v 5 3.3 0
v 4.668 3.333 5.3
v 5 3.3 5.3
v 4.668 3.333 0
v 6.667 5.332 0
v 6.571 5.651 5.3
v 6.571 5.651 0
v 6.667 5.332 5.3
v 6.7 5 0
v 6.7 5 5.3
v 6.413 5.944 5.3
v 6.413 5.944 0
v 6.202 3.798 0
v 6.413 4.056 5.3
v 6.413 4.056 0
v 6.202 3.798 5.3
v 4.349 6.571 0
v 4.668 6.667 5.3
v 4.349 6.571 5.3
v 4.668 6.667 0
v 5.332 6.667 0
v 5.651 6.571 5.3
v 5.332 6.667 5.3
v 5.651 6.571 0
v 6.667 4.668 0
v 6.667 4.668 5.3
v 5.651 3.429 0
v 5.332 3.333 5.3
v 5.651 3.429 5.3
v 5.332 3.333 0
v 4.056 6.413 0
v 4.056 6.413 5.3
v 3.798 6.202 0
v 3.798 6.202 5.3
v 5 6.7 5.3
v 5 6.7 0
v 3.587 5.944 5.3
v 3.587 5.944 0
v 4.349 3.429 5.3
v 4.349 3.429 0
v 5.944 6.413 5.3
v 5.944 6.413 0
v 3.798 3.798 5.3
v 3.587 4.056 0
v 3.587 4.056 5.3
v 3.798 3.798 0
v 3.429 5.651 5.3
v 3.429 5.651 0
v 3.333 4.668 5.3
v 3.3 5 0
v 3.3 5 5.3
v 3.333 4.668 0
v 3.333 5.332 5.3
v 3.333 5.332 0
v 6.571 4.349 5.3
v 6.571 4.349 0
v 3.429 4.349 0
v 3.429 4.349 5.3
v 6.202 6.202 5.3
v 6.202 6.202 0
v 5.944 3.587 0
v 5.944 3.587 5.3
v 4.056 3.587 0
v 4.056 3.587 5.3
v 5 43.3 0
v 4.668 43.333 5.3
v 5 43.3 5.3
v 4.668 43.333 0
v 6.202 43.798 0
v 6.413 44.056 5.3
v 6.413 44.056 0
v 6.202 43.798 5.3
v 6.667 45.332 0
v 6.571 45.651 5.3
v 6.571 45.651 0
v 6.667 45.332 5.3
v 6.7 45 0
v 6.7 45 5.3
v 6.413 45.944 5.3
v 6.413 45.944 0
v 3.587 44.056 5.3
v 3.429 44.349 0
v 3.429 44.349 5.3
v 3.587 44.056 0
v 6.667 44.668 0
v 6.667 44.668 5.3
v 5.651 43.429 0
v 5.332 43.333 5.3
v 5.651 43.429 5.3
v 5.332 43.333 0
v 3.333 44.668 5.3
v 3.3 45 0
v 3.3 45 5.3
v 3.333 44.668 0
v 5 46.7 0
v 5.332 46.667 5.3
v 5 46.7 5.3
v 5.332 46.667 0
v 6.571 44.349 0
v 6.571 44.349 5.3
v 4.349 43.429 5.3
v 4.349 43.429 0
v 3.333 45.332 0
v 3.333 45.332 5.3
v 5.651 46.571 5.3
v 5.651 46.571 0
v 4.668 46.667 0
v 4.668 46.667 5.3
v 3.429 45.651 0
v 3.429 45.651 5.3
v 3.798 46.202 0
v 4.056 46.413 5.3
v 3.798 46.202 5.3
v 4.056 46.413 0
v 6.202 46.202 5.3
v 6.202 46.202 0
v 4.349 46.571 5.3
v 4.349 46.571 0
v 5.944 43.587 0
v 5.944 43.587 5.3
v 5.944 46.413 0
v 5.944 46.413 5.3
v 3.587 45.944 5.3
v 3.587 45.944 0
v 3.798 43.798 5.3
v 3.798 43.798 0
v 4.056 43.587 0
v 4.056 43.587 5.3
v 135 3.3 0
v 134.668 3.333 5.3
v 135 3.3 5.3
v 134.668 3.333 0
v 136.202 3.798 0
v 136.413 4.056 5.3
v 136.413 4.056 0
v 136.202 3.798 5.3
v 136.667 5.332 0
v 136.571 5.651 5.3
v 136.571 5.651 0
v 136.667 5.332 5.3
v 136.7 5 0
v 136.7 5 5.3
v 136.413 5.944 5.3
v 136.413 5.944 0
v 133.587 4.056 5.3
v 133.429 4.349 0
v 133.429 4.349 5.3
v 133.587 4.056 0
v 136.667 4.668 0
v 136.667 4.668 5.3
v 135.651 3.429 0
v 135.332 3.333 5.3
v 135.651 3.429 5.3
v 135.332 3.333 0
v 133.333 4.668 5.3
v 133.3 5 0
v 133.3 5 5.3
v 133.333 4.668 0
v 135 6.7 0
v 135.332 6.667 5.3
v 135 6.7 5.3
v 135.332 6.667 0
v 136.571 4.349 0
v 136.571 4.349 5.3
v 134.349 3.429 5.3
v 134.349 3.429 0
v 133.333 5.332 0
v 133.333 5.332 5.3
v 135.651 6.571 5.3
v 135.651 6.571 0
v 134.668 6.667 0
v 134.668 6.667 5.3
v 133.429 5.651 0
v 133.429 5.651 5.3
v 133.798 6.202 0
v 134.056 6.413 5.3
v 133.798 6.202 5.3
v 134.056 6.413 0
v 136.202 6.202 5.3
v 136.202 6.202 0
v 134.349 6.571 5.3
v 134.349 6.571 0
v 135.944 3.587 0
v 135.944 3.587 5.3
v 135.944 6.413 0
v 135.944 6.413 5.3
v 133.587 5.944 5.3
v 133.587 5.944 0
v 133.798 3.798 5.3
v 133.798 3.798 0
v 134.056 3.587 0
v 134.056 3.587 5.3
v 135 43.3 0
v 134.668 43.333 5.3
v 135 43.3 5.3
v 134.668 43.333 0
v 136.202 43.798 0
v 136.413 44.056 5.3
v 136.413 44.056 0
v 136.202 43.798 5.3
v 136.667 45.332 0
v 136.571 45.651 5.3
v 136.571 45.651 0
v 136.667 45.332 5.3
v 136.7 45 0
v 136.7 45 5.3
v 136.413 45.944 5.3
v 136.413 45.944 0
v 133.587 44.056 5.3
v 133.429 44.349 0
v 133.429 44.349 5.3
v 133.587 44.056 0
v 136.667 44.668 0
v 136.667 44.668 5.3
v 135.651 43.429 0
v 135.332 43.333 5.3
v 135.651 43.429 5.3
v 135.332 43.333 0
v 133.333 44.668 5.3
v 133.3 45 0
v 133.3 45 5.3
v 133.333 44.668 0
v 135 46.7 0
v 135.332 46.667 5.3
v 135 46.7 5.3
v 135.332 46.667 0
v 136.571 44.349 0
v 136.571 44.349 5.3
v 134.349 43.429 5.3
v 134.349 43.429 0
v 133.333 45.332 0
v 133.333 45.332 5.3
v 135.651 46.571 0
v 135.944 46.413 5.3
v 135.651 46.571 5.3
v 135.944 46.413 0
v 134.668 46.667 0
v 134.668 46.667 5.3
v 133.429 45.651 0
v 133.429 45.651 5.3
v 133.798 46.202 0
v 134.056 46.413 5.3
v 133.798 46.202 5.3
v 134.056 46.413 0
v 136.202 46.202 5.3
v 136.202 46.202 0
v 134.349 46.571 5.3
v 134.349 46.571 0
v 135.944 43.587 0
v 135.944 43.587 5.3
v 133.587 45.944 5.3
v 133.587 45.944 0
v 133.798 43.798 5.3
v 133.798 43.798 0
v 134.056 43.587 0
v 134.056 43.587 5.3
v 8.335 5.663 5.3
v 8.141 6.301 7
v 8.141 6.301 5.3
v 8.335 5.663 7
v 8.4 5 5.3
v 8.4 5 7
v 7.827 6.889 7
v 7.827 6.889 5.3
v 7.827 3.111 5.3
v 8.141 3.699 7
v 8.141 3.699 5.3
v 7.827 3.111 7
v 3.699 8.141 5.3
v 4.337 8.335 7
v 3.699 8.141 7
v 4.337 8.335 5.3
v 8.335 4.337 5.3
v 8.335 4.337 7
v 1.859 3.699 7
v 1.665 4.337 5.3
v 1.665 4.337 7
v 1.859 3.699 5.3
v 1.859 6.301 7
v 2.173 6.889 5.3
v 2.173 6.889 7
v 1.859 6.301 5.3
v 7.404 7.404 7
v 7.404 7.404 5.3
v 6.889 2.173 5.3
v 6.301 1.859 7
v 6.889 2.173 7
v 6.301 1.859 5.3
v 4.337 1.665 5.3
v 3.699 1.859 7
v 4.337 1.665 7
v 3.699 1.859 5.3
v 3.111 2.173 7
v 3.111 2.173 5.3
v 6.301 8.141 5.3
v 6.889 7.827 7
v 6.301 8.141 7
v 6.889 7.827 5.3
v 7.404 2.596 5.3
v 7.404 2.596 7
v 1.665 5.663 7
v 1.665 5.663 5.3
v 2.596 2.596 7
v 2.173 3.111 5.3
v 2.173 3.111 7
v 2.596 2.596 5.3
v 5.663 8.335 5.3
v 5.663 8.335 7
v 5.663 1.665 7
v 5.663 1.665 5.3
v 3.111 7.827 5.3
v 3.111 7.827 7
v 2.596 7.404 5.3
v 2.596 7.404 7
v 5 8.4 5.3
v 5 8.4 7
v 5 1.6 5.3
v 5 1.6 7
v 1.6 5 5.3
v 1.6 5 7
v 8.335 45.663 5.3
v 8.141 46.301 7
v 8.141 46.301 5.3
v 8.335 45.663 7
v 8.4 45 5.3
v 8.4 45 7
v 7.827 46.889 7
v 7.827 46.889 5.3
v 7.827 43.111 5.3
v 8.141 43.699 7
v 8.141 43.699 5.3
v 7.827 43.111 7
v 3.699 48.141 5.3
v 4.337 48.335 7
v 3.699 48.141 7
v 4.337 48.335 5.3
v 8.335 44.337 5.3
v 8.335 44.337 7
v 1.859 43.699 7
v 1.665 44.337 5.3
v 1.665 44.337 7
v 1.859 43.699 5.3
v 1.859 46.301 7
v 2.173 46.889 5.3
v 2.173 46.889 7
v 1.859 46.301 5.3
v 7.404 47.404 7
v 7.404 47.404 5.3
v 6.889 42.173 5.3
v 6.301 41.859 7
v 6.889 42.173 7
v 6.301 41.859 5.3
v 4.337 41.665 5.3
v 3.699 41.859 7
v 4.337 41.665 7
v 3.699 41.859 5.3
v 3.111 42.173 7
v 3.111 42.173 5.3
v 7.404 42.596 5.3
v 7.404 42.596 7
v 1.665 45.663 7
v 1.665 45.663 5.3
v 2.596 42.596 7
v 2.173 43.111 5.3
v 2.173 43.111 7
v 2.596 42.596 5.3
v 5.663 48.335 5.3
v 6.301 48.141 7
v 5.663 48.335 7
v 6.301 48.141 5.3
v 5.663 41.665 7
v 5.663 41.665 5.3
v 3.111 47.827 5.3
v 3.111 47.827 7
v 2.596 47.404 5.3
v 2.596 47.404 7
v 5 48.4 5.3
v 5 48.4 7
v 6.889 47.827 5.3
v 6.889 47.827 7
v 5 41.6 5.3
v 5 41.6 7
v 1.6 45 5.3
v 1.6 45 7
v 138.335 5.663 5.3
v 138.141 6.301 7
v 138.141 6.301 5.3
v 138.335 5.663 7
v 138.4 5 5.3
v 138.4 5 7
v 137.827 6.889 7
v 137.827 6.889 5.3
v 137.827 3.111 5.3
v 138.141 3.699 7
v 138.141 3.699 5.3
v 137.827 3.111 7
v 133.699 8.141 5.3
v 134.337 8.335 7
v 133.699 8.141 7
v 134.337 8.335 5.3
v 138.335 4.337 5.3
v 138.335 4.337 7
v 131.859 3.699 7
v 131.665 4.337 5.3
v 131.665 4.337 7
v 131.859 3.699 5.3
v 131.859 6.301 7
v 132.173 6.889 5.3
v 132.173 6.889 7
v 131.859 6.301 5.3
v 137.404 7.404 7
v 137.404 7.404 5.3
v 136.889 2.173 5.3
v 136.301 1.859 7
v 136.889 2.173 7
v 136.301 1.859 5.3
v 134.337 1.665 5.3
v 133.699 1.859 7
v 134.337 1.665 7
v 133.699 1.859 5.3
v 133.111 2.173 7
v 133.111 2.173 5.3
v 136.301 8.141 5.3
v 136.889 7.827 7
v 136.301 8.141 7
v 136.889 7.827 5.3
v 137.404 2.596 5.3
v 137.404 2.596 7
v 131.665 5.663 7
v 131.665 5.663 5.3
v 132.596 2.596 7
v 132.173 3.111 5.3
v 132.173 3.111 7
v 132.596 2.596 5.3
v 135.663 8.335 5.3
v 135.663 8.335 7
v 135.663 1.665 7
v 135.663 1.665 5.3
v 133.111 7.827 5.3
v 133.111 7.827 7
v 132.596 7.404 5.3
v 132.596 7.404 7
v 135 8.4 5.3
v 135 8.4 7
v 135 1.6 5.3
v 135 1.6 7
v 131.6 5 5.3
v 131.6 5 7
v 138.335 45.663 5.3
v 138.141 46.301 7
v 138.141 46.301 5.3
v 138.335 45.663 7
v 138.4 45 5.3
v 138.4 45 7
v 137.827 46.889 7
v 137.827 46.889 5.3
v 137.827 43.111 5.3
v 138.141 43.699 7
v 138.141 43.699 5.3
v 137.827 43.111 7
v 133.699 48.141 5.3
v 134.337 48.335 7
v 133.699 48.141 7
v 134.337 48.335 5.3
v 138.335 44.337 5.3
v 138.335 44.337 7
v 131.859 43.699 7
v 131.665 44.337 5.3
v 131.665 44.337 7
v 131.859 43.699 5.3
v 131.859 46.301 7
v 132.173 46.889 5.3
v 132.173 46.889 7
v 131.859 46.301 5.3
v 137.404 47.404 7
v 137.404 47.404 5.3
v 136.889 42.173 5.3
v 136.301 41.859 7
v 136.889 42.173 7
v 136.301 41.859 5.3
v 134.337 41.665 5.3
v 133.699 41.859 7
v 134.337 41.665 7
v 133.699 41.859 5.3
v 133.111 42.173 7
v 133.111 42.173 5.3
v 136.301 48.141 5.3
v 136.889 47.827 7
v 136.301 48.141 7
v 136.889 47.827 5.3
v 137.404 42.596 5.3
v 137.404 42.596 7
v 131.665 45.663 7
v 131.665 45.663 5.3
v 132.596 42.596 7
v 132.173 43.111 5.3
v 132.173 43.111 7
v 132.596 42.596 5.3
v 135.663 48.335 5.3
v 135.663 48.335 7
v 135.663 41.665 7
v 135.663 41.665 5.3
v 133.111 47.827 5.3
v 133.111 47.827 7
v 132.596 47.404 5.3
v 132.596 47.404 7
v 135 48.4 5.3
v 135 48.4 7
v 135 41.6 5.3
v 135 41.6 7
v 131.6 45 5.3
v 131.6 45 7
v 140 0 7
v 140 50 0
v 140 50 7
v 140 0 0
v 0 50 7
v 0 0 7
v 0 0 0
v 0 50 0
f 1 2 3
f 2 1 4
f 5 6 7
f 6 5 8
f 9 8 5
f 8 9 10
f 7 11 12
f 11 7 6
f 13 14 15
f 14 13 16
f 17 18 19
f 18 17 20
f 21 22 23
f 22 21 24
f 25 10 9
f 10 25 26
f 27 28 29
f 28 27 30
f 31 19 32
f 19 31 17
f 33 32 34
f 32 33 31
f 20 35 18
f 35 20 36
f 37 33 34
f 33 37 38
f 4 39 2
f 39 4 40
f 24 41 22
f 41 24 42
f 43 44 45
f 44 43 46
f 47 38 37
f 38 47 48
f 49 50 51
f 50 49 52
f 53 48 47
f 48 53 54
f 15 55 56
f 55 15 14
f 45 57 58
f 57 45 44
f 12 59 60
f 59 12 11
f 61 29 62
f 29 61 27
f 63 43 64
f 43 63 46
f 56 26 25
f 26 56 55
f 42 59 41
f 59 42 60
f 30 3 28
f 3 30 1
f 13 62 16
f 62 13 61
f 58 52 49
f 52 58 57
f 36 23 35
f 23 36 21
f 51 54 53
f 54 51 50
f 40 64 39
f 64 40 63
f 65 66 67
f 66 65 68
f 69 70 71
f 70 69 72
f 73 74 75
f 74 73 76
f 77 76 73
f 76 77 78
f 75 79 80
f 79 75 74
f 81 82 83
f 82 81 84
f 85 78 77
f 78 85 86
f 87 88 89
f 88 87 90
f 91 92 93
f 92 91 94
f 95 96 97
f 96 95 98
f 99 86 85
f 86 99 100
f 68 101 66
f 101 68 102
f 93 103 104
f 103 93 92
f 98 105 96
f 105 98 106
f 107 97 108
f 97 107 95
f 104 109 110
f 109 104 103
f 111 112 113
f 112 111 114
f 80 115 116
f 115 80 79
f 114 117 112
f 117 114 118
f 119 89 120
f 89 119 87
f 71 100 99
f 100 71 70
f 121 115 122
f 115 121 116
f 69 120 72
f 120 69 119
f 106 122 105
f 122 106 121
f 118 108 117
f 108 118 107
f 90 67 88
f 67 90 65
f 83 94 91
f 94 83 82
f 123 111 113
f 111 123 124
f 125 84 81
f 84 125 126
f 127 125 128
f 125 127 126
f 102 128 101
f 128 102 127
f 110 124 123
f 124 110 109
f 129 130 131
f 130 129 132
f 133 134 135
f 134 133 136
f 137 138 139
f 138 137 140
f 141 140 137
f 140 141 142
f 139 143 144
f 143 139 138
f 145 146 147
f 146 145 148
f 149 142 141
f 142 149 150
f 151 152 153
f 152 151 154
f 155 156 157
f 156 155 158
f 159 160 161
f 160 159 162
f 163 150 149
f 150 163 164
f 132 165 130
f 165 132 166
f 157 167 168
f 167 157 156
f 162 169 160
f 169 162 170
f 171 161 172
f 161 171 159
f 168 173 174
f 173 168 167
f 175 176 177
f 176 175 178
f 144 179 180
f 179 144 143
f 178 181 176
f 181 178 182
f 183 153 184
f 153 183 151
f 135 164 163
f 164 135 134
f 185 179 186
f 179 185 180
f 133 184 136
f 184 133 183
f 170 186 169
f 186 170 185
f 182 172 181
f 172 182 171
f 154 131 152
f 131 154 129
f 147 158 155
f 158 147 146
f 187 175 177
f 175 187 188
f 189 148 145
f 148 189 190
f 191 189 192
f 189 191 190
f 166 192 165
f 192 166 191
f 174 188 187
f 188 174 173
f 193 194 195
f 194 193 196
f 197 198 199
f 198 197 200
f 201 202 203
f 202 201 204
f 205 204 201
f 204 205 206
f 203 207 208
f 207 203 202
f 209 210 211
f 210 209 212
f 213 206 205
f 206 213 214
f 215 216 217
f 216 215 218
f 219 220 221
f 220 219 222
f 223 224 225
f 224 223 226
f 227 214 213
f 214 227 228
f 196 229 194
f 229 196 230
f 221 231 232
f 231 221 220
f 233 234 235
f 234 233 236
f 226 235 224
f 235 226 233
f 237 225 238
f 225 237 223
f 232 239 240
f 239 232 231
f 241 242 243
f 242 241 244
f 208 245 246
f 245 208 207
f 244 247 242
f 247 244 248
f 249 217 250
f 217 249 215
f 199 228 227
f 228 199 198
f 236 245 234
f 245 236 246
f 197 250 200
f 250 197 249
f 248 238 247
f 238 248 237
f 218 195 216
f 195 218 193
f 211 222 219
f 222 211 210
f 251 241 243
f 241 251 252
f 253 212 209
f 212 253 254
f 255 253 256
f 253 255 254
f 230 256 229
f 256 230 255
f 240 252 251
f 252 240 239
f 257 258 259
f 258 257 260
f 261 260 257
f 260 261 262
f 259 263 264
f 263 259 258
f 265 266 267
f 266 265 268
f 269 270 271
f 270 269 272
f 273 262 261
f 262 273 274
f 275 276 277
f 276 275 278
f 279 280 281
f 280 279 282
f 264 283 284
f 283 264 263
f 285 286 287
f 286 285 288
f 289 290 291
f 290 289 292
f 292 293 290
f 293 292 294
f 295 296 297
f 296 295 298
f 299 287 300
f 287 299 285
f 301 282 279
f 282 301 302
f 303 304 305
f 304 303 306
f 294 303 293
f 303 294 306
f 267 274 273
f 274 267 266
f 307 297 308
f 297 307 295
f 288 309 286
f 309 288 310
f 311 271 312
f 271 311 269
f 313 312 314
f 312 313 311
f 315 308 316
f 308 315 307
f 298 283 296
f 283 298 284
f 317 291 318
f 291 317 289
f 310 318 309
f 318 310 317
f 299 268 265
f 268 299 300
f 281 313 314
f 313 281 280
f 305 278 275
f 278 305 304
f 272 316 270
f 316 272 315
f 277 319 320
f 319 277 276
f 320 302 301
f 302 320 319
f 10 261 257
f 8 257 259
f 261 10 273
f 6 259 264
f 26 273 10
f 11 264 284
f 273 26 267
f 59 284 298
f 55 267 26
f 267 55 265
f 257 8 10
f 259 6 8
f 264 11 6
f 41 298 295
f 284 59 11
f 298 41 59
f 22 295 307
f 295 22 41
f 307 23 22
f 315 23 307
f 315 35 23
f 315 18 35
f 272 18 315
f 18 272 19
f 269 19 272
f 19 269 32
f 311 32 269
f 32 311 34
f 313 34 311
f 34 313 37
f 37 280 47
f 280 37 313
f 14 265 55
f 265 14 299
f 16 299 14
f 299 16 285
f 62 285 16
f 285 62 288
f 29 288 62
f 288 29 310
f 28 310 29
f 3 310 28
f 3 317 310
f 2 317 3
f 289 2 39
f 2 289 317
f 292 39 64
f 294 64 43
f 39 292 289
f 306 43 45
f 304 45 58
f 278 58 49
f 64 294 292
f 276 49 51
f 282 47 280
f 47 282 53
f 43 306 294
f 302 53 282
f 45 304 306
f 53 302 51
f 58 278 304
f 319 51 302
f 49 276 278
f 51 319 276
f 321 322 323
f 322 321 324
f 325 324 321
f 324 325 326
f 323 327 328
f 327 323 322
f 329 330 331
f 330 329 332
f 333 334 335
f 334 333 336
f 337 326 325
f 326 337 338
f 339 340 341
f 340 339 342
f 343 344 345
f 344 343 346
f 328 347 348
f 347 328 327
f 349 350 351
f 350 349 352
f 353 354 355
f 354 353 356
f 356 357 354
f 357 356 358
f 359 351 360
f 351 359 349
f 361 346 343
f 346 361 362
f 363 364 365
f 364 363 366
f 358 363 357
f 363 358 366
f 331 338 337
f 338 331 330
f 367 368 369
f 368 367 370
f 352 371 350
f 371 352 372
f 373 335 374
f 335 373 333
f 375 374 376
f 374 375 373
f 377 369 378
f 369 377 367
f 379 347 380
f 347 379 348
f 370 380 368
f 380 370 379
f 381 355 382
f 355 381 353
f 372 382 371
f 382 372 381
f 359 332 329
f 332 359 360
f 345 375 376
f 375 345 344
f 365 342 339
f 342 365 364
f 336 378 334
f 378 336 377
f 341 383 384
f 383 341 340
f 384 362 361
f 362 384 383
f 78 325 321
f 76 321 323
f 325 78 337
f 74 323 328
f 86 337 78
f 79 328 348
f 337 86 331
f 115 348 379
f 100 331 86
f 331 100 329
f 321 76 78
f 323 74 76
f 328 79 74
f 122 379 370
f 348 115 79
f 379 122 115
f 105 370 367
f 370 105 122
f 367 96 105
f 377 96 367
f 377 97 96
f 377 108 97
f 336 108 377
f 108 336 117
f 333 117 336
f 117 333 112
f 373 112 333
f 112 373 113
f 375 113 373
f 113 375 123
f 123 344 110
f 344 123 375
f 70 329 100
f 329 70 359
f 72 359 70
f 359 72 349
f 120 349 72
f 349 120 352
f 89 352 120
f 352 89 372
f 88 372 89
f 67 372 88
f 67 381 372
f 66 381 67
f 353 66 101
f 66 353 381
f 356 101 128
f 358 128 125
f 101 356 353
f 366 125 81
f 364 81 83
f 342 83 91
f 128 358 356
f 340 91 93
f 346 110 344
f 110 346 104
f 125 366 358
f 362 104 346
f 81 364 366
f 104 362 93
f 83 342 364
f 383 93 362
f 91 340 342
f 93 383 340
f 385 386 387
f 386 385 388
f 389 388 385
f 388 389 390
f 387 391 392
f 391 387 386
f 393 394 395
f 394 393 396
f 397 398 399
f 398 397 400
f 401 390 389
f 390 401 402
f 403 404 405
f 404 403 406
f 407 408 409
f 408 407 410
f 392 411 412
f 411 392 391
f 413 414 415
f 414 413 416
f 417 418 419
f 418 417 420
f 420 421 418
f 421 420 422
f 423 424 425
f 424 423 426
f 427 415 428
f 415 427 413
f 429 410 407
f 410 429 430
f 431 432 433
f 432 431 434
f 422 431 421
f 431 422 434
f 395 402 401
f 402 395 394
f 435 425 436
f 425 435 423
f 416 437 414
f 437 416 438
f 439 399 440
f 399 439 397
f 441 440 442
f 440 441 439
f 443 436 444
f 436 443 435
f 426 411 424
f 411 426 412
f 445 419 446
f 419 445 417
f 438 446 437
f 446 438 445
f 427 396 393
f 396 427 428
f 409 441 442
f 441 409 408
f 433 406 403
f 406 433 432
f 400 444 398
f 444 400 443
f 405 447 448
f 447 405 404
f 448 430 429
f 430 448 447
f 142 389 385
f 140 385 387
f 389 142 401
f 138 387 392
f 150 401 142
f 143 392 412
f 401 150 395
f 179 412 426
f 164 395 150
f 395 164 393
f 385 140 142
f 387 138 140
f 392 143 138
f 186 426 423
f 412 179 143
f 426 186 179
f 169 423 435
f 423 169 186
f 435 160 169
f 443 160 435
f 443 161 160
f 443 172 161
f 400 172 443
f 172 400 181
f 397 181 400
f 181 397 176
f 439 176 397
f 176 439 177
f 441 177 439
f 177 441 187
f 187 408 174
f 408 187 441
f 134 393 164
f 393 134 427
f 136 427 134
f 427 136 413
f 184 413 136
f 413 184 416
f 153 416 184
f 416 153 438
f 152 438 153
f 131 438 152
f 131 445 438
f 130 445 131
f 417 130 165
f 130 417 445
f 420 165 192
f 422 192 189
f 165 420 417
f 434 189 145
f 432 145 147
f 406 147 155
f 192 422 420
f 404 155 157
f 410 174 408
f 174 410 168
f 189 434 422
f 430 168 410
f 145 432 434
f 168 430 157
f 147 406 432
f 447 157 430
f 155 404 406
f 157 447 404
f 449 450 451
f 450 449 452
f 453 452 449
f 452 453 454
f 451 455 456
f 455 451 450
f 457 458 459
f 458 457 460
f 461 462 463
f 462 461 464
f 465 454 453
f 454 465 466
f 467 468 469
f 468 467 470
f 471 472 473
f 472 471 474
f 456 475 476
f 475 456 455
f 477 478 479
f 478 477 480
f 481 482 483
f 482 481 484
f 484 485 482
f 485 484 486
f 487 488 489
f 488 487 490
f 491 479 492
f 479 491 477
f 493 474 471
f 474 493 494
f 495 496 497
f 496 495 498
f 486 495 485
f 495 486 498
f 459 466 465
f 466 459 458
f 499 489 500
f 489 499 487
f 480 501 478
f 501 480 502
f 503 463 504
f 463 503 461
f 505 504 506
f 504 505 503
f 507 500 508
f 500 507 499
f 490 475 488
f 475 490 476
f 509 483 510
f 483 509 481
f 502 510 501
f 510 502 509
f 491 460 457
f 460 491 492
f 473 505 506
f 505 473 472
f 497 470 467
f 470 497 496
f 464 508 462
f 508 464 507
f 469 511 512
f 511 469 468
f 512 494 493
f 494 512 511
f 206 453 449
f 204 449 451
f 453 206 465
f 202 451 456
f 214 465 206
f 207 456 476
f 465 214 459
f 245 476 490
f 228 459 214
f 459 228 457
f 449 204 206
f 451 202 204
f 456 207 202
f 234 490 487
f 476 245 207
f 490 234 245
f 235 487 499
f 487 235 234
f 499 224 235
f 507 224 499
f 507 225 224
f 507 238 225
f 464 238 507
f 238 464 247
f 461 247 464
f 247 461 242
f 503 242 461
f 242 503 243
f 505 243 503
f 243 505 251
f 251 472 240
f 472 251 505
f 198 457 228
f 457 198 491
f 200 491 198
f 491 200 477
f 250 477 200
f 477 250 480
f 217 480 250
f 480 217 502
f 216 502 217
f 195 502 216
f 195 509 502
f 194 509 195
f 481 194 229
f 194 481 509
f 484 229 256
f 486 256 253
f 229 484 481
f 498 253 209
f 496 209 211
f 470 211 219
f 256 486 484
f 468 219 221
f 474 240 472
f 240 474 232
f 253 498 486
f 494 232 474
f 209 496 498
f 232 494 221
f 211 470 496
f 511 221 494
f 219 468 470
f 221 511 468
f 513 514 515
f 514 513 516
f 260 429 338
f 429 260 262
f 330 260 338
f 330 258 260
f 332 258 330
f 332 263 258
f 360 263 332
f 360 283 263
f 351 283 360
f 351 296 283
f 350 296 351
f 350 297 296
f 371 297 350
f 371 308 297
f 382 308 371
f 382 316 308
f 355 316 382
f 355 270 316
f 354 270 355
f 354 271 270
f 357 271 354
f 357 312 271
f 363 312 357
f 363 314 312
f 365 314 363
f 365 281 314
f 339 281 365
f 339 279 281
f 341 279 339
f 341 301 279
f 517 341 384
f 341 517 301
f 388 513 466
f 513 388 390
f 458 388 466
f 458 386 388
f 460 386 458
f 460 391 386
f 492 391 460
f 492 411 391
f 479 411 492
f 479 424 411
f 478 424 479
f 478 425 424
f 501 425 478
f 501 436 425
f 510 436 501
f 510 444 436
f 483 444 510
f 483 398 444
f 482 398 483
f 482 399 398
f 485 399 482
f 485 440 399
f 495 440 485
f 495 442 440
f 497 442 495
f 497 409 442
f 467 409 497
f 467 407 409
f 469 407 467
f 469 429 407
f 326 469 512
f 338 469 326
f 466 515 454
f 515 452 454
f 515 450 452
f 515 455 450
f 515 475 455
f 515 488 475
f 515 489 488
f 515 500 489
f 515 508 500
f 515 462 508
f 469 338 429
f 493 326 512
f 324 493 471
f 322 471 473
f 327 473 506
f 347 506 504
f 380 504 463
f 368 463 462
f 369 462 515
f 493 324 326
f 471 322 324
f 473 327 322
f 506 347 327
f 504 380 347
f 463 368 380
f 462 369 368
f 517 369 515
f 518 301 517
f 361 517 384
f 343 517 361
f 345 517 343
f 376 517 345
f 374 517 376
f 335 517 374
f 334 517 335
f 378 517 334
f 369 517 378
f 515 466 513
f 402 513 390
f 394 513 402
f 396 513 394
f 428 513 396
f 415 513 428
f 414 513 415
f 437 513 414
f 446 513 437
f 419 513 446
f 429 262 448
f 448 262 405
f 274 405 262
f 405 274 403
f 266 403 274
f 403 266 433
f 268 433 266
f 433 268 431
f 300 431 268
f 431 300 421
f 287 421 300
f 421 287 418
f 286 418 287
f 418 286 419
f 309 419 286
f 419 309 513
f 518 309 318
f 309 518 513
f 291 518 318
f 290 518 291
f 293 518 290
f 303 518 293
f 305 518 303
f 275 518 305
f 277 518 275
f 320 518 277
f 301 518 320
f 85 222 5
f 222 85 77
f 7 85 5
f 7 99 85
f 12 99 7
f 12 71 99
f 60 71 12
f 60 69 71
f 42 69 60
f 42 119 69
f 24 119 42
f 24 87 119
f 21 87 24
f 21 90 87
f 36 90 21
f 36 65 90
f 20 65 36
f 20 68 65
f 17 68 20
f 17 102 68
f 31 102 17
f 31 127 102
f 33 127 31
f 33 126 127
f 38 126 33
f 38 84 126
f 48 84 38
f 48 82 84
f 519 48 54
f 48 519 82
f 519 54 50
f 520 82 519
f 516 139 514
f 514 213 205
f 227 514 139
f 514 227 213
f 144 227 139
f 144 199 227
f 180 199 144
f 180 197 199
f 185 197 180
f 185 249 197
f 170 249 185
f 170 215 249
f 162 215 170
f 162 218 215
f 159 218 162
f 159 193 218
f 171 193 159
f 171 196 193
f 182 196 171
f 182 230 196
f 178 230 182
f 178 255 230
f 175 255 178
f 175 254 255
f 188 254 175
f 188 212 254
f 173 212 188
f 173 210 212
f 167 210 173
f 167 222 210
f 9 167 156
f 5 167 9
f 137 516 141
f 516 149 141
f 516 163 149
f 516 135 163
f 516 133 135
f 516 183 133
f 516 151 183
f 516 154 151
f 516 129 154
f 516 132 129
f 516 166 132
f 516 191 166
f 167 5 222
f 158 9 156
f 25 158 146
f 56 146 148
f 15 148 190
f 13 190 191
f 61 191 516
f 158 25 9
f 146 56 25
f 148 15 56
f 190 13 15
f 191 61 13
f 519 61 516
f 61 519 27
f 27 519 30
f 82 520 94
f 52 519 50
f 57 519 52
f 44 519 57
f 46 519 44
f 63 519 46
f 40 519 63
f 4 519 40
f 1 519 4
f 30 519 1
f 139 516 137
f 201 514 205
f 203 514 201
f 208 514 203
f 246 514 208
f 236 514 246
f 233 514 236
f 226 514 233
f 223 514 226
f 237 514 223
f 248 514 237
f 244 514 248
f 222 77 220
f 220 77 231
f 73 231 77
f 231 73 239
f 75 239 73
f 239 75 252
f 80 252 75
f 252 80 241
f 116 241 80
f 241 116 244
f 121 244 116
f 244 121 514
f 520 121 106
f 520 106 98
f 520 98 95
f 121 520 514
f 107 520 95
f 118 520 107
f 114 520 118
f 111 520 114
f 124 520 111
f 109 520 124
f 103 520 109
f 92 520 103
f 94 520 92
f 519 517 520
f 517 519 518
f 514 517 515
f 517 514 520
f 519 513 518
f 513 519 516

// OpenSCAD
$fn = 32;

// ----------------------------------------------------------------------
// Enclosure lid: 140 x 50 x 7 mm, 4 bolt holes
// ----------------------------------------------------------------------

// --- parameters (mm) ---
length = 140;             // lid length, X
width = 50;               // lid width, Y
plate_t = 7;              // lid plate thickness
bolt_d = 3.4;             // bolt clearance
boss_lip = 5;             // bolt hole inset from the corner
sink = 1;                 // overlap of the lip and ribs into the plate
cs_d = 6.8;               // countersink diameter
cs_h = 1.7;               // countersink depth

module plate() {
  cube([length, width, plate_t]);
}

difference() {
  plate();
  /* bolt pattern matching the corner bosses */
  for (sx = [0, 1]) for (sy = [0, 1])
    translate([sx * (length - 2 * boss_lip) + boss_lip, sy * (width - 2 * boss_lip) + boss_lip, -0 - 1])
      cylinder(h = plate_t + 0 + 2, d = bolt_d);
  /* countersinks so the heads sit flush */
  for (sx = [0, 1]) for (sy = [0, 1])
    translate([sx * (length - 2 * boss_lip) + boss_lip, sy * (width - 2 * boss_lip) + boss_lip, plate_t - cs_h])
      cylinder(h = cs_h + 0.5, d = cs_d);
}
